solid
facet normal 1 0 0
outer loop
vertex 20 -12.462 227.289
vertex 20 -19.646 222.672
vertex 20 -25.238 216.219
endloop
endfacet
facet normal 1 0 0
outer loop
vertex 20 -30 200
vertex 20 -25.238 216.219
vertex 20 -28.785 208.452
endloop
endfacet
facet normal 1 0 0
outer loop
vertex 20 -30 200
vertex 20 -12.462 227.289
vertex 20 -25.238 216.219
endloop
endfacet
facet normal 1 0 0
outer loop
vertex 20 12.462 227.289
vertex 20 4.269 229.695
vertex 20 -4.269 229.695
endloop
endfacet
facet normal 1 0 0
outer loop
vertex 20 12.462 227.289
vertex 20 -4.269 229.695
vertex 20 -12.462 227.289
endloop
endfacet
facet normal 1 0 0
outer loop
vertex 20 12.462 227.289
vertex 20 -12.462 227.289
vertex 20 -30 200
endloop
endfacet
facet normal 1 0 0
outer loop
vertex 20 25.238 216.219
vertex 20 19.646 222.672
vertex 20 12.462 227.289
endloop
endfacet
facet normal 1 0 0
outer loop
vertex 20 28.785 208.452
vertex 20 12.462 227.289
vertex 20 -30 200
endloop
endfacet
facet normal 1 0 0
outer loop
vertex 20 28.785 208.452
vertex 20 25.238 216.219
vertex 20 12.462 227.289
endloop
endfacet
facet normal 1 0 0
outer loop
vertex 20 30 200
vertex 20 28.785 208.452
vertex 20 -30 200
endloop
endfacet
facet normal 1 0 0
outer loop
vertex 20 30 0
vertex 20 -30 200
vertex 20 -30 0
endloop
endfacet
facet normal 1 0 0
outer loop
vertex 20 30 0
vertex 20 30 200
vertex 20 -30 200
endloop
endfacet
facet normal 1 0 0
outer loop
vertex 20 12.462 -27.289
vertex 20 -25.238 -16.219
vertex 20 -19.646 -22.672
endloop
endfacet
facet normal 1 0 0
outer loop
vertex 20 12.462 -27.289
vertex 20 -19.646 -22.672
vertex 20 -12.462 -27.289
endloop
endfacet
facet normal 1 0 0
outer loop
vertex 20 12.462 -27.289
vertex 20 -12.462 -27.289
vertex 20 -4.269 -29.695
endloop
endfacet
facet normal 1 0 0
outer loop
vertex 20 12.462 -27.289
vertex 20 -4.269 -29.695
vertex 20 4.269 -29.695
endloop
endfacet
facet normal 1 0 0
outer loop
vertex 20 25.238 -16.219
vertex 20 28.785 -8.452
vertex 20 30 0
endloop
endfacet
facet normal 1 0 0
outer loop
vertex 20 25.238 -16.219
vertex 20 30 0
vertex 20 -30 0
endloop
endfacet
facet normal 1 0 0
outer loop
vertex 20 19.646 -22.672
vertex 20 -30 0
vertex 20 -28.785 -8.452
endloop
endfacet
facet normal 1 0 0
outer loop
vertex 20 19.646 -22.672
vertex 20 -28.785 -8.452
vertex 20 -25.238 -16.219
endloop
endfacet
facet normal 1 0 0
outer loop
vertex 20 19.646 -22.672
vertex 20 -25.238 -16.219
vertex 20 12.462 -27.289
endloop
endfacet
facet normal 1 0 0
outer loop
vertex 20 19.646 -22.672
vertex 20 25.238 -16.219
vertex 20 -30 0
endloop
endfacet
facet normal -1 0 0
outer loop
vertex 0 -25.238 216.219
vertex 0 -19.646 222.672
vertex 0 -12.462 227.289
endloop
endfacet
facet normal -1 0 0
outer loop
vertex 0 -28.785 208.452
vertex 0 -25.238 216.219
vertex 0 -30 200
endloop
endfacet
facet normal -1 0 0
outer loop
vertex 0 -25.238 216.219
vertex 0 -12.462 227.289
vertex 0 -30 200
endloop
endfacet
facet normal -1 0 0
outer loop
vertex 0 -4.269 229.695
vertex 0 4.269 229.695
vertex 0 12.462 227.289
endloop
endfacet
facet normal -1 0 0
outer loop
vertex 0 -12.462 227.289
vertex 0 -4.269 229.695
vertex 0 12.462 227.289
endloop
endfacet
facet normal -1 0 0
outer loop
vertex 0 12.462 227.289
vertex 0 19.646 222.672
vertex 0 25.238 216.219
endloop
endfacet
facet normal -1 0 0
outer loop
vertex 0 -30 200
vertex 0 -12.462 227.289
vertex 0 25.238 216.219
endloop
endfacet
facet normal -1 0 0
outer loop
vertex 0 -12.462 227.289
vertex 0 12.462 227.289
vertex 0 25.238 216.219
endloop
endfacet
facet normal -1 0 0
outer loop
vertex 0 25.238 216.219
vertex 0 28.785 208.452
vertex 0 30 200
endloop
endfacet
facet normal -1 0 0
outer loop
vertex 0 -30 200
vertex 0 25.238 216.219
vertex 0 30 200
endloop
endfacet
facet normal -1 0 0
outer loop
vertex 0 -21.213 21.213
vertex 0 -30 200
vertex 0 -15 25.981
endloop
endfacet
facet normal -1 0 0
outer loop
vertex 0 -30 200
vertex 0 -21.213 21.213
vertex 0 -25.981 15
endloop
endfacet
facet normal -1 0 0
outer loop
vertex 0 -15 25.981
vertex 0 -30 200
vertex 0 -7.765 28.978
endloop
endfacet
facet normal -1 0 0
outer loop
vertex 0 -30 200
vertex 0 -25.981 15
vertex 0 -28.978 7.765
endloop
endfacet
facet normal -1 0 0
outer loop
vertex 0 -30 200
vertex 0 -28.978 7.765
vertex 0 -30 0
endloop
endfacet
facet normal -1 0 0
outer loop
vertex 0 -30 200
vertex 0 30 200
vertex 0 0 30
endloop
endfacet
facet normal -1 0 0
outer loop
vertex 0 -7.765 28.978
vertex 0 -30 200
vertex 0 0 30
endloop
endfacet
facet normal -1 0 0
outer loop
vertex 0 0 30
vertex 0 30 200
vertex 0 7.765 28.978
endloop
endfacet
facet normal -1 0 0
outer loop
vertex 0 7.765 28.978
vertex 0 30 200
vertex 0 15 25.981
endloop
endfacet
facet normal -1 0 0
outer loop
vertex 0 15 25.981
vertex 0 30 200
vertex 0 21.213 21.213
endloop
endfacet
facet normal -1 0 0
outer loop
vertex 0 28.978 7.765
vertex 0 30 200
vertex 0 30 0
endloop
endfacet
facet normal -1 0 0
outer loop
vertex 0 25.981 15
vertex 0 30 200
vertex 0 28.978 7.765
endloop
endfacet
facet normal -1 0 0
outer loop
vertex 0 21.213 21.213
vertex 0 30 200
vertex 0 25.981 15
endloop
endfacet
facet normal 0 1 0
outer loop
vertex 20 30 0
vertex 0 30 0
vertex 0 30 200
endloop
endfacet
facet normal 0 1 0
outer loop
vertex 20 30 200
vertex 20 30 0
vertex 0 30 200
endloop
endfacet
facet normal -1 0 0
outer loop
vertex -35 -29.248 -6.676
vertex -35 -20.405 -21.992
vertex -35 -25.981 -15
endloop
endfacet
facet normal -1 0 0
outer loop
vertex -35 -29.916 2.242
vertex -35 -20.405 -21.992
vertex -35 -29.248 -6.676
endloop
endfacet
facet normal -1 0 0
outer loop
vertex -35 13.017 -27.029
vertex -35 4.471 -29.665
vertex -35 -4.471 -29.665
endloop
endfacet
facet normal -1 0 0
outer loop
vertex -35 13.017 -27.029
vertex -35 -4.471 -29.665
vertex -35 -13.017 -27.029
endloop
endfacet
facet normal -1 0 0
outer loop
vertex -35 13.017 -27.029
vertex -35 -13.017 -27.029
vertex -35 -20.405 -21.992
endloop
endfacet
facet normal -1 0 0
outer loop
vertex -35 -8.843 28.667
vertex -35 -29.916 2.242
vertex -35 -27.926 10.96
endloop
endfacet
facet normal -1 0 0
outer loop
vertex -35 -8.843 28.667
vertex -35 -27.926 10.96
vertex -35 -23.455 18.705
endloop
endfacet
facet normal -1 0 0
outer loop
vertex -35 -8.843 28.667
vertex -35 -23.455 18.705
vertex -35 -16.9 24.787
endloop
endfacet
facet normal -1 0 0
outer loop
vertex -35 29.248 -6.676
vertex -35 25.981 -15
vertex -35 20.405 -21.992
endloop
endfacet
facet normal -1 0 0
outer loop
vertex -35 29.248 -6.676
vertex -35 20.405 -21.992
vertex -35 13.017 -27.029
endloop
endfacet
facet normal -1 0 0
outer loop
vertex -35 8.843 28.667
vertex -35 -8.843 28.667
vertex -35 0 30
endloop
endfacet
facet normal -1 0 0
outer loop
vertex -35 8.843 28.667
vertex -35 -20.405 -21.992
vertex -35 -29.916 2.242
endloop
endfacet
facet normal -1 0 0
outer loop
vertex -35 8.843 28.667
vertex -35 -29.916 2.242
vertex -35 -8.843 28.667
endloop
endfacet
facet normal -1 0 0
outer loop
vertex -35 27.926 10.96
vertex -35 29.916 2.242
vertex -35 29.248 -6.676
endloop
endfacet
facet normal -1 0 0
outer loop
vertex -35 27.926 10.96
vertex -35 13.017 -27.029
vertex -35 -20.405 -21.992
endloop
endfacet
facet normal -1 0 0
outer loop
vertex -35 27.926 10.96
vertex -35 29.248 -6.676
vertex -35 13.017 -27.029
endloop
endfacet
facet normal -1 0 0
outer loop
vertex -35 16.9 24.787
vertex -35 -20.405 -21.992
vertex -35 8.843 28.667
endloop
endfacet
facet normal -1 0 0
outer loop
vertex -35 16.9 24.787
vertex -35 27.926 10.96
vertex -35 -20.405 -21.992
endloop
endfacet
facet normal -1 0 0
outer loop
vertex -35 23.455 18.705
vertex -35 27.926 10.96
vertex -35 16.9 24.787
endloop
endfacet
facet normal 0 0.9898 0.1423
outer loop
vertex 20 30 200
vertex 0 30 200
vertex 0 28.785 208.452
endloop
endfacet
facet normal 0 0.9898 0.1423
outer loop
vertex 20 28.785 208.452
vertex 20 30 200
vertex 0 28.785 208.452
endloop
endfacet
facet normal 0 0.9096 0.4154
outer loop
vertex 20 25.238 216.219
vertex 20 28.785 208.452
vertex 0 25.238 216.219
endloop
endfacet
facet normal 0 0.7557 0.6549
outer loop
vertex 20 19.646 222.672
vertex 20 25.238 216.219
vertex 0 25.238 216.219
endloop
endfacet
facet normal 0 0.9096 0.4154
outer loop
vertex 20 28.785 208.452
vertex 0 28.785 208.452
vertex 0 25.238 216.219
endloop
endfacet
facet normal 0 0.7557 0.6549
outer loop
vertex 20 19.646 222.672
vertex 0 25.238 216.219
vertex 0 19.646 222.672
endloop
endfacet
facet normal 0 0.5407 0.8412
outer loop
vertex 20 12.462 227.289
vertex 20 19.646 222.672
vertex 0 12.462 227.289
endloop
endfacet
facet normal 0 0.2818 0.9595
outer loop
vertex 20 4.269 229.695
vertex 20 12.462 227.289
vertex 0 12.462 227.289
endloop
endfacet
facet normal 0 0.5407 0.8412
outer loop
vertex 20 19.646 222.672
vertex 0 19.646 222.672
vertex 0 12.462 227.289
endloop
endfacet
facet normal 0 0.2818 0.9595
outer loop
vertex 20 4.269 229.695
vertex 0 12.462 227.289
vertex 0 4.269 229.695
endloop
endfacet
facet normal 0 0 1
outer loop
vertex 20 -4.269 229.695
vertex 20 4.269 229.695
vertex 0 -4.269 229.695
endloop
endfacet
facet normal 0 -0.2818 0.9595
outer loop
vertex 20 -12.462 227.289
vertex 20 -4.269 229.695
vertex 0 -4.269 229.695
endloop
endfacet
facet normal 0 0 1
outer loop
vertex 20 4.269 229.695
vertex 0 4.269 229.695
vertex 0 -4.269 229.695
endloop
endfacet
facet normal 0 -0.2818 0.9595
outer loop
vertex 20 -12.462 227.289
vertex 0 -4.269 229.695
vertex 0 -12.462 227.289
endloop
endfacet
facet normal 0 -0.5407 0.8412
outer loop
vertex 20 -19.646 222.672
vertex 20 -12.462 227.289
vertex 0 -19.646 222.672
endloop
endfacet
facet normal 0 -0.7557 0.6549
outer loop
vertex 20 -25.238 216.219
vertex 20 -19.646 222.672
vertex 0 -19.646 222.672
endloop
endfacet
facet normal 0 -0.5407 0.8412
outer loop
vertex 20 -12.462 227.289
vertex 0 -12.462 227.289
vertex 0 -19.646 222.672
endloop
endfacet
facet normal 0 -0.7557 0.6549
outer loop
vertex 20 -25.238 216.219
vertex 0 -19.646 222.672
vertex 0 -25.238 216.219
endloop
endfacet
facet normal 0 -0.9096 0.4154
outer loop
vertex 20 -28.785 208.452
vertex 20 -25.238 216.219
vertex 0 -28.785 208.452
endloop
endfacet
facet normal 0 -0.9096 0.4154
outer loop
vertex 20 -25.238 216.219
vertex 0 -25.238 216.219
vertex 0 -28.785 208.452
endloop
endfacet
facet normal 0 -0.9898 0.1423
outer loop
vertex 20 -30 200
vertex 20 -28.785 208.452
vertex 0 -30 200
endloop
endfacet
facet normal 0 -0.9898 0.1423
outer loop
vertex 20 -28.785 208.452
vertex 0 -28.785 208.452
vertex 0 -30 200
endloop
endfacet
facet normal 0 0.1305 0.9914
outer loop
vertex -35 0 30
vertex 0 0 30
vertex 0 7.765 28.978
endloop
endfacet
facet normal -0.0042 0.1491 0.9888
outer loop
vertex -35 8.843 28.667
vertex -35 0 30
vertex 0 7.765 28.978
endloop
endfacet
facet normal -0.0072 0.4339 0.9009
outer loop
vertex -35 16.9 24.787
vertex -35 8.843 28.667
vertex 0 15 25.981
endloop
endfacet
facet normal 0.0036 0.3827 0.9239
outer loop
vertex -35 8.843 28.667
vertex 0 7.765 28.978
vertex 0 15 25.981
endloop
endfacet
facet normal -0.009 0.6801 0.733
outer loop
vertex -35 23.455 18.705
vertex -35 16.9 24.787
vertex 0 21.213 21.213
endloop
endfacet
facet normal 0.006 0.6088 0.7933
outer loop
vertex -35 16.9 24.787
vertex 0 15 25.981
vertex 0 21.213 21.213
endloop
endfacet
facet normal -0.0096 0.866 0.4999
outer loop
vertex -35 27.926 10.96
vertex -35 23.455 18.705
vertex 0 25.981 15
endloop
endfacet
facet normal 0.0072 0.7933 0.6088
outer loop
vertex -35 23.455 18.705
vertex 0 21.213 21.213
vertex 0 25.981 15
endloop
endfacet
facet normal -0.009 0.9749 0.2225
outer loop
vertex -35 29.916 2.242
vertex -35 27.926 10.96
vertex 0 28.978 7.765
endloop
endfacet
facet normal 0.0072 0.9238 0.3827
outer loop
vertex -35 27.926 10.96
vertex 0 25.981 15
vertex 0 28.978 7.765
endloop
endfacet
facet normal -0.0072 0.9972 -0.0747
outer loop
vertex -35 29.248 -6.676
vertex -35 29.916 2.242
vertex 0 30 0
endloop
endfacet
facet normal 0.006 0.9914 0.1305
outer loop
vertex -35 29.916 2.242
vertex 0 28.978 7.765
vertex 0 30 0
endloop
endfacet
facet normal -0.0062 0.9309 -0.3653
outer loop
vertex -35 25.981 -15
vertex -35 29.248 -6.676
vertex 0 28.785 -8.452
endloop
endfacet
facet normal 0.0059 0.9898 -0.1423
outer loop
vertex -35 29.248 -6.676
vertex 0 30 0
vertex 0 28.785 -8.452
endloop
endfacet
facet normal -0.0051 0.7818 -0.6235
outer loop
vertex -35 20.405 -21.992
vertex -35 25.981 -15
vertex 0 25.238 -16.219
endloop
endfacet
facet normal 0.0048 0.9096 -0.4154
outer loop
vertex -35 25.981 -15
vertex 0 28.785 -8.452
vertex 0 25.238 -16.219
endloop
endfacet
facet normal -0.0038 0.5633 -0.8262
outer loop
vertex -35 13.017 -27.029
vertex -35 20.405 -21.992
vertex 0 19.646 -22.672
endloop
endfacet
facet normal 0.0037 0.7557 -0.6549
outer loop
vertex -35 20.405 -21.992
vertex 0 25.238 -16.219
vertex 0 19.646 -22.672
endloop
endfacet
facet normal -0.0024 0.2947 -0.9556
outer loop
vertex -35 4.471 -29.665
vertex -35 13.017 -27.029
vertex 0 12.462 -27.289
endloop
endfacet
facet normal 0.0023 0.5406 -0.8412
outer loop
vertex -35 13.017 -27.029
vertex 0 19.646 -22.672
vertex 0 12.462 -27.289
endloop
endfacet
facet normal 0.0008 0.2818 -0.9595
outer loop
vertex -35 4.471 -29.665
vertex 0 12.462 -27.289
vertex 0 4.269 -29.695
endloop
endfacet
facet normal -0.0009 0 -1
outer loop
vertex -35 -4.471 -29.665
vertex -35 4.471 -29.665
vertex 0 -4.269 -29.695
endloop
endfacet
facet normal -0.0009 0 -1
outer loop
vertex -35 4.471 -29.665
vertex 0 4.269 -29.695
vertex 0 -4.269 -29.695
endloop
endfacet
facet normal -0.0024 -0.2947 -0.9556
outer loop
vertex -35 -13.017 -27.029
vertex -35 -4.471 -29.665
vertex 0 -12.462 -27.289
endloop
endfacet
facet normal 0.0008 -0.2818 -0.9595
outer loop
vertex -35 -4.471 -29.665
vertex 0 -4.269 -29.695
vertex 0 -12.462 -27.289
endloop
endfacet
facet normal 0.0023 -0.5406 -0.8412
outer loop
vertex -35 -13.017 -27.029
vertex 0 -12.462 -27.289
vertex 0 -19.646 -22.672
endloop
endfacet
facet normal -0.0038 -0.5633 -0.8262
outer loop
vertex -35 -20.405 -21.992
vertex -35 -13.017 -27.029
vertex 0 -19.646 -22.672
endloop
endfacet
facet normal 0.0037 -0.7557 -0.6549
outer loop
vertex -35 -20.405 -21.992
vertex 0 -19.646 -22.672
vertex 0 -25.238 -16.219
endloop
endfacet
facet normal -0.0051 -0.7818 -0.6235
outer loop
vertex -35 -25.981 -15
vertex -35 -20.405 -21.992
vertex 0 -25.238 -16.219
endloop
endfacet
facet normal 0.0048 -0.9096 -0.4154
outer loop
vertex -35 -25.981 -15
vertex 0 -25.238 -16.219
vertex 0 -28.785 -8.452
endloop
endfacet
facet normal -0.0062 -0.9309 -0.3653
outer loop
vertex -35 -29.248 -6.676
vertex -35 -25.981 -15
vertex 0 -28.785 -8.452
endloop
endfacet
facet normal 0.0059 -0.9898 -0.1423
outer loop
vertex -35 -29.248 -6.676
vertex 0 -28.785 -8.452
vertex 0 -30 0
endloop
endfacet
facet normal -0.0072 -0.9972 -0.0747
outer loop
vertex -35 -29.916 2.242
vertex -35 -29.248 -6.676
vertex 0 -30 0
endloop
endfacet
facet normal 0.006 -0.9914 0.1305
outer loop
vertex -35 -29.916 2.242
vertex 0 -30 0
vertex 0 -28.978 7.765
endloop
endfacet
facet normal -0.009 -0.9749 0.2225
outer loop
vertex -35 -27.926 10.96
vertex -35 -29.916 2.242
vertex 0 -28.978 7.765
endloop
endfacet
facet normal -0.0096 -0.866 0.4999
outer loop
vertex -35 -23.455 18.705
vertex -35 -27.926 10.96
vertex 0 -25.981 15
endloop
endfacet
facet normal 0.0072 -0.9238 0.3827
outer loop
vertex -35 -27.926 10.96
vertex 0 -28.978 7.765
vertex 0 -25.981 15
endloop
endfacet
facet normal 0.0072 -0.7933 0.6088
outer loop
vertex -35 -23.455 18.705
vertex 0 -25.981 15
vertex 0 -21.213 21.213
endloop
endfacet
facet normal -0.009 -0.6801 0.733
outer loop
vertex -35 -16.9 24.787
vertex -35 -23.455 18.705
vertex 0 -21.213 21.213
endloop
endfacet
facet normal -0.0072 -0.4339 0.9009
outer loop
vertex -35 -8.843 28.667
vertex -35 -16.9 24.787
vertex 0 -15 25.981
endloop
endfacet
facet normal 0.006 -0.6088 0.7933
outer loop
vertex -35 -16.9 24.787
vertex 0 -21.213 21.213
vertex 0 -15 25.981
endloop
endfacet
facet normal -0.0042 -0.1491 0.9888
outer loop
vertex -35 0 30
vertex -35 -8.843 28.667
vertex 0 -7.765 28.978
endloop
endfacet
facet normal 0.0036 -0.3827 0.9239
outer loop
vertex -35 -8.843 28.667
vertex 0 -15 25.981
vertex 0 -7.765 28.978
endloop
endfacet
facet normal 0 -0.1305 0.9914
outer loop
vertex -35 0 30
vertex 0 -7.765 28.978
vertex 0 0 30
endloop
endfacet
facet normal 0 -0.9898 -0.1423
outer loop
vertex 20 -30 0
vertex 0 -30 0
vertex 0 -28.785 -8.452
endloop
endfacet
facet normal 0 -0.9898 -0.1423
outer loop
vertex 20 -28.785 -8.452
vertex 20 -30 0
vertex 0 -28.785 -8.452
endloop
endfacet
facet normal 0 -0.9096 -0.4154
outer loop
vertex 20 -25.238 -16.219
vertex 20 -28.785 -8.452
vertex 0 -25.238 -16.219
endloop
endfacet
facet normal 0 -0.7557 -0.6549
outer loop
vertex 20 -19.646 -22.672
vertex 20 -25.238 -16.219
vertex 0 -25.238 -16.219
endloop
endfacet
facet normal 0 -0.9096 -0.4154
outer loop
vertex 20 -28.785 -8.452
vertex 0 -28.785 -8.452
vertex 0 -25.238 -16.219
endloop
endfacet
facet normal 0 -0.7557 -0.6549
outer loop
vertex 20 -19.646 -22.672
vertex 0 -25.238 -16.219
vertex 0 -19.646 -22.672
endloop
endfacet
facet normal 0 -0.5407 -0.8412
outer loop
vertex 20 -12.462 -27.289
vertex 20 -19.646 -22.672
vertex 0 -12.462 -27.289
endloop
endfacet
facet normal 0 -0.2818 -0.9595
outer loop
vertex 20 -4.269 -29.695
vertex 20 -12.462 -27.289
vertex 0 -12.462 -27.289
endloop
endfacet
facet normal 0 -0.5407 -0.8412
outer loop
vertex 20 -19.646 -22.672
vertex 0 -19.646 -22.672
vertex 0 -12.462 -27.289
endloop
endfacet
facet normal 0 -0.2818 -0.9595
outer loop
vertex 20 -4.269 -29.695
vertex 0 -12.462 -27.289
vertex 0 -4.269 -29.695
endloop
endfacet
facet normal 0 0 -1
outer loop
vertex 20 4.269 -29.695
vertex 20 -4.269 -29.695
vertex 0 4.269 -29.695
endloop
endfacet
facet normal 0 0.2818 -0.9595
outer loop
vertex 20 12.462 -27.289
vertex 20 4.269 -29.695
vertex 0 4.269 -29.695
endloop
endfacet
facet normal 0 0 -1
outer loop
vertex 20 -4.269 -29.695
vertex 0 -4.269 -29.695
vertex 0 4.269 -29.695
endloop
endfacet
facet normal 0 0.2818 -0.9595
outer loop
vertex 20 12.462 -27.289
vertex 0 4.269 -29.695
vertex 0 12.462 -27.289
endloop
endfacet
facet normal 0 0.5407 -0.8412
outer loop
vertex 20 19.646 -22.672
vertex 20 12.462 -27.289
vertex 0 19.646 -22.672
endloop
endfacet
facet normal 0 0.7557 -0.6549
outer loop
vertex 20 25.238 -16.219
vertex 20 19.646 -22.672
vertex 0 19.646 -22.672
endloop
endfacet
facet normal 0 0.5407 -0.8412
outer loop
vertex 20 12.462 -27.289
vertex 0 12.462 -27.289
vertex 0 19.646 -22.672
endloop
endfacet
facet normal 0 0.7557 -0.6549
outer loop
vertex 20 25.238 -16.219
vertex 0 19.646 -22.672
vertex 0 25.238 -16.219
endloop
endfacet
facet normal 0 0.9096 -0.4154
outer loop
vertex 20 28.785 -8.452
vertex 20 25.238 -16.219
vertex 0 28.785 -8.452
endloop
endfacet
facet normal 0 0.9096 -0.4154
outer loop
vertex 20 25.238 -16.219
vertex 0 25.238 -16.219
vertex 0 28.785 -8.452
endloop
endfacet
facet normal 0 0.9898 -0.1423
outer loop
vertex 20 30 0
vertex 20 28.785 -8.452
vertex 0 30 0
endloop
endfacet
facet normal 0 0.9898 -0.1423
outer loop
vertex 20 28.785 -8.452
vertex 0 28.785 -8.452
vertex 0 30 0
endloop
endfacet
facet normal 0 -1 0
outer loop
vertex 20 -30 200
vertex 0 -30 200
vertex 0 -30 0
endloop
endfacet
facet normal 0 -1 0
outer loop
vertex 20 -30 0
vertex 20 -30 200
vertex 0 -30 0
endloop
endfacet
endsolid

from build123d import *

# Parameters (mm, degrees)
EXTRUDE_1_DEPTH = 20
SKETCH_2_R      = 30
EXTRUDE_2_DEPTH = 35


with BuildPart() as part:
    # 草图1 → 凸台-拉伸1 (new body)
    with BuildSketch(Plane(origin=(0, 0, 0), x_dir=(0, 0, -1), z_dir=(1, 0, 0))):
        with BuildLine():
            Line((0, 30), (-200, 30))
            ThreePointArc((-200, 30), (-230, 0), (-200, -30))
            Line((-200, -30), (0, -30))
            ThreePointArc((0, -30), (30, 0), (0, 30))
        make_face()
    extrude(amount=EXTRUDE_1_DEPTH)

    # 草图2 → 凸台-拉伸2 (add)
    with BuildSketch(Plane.ZY):
        Circle(SKETCH_2_R)
    extrude(amount=EXTRUDE_2_DEPTH)


solid = part.part
